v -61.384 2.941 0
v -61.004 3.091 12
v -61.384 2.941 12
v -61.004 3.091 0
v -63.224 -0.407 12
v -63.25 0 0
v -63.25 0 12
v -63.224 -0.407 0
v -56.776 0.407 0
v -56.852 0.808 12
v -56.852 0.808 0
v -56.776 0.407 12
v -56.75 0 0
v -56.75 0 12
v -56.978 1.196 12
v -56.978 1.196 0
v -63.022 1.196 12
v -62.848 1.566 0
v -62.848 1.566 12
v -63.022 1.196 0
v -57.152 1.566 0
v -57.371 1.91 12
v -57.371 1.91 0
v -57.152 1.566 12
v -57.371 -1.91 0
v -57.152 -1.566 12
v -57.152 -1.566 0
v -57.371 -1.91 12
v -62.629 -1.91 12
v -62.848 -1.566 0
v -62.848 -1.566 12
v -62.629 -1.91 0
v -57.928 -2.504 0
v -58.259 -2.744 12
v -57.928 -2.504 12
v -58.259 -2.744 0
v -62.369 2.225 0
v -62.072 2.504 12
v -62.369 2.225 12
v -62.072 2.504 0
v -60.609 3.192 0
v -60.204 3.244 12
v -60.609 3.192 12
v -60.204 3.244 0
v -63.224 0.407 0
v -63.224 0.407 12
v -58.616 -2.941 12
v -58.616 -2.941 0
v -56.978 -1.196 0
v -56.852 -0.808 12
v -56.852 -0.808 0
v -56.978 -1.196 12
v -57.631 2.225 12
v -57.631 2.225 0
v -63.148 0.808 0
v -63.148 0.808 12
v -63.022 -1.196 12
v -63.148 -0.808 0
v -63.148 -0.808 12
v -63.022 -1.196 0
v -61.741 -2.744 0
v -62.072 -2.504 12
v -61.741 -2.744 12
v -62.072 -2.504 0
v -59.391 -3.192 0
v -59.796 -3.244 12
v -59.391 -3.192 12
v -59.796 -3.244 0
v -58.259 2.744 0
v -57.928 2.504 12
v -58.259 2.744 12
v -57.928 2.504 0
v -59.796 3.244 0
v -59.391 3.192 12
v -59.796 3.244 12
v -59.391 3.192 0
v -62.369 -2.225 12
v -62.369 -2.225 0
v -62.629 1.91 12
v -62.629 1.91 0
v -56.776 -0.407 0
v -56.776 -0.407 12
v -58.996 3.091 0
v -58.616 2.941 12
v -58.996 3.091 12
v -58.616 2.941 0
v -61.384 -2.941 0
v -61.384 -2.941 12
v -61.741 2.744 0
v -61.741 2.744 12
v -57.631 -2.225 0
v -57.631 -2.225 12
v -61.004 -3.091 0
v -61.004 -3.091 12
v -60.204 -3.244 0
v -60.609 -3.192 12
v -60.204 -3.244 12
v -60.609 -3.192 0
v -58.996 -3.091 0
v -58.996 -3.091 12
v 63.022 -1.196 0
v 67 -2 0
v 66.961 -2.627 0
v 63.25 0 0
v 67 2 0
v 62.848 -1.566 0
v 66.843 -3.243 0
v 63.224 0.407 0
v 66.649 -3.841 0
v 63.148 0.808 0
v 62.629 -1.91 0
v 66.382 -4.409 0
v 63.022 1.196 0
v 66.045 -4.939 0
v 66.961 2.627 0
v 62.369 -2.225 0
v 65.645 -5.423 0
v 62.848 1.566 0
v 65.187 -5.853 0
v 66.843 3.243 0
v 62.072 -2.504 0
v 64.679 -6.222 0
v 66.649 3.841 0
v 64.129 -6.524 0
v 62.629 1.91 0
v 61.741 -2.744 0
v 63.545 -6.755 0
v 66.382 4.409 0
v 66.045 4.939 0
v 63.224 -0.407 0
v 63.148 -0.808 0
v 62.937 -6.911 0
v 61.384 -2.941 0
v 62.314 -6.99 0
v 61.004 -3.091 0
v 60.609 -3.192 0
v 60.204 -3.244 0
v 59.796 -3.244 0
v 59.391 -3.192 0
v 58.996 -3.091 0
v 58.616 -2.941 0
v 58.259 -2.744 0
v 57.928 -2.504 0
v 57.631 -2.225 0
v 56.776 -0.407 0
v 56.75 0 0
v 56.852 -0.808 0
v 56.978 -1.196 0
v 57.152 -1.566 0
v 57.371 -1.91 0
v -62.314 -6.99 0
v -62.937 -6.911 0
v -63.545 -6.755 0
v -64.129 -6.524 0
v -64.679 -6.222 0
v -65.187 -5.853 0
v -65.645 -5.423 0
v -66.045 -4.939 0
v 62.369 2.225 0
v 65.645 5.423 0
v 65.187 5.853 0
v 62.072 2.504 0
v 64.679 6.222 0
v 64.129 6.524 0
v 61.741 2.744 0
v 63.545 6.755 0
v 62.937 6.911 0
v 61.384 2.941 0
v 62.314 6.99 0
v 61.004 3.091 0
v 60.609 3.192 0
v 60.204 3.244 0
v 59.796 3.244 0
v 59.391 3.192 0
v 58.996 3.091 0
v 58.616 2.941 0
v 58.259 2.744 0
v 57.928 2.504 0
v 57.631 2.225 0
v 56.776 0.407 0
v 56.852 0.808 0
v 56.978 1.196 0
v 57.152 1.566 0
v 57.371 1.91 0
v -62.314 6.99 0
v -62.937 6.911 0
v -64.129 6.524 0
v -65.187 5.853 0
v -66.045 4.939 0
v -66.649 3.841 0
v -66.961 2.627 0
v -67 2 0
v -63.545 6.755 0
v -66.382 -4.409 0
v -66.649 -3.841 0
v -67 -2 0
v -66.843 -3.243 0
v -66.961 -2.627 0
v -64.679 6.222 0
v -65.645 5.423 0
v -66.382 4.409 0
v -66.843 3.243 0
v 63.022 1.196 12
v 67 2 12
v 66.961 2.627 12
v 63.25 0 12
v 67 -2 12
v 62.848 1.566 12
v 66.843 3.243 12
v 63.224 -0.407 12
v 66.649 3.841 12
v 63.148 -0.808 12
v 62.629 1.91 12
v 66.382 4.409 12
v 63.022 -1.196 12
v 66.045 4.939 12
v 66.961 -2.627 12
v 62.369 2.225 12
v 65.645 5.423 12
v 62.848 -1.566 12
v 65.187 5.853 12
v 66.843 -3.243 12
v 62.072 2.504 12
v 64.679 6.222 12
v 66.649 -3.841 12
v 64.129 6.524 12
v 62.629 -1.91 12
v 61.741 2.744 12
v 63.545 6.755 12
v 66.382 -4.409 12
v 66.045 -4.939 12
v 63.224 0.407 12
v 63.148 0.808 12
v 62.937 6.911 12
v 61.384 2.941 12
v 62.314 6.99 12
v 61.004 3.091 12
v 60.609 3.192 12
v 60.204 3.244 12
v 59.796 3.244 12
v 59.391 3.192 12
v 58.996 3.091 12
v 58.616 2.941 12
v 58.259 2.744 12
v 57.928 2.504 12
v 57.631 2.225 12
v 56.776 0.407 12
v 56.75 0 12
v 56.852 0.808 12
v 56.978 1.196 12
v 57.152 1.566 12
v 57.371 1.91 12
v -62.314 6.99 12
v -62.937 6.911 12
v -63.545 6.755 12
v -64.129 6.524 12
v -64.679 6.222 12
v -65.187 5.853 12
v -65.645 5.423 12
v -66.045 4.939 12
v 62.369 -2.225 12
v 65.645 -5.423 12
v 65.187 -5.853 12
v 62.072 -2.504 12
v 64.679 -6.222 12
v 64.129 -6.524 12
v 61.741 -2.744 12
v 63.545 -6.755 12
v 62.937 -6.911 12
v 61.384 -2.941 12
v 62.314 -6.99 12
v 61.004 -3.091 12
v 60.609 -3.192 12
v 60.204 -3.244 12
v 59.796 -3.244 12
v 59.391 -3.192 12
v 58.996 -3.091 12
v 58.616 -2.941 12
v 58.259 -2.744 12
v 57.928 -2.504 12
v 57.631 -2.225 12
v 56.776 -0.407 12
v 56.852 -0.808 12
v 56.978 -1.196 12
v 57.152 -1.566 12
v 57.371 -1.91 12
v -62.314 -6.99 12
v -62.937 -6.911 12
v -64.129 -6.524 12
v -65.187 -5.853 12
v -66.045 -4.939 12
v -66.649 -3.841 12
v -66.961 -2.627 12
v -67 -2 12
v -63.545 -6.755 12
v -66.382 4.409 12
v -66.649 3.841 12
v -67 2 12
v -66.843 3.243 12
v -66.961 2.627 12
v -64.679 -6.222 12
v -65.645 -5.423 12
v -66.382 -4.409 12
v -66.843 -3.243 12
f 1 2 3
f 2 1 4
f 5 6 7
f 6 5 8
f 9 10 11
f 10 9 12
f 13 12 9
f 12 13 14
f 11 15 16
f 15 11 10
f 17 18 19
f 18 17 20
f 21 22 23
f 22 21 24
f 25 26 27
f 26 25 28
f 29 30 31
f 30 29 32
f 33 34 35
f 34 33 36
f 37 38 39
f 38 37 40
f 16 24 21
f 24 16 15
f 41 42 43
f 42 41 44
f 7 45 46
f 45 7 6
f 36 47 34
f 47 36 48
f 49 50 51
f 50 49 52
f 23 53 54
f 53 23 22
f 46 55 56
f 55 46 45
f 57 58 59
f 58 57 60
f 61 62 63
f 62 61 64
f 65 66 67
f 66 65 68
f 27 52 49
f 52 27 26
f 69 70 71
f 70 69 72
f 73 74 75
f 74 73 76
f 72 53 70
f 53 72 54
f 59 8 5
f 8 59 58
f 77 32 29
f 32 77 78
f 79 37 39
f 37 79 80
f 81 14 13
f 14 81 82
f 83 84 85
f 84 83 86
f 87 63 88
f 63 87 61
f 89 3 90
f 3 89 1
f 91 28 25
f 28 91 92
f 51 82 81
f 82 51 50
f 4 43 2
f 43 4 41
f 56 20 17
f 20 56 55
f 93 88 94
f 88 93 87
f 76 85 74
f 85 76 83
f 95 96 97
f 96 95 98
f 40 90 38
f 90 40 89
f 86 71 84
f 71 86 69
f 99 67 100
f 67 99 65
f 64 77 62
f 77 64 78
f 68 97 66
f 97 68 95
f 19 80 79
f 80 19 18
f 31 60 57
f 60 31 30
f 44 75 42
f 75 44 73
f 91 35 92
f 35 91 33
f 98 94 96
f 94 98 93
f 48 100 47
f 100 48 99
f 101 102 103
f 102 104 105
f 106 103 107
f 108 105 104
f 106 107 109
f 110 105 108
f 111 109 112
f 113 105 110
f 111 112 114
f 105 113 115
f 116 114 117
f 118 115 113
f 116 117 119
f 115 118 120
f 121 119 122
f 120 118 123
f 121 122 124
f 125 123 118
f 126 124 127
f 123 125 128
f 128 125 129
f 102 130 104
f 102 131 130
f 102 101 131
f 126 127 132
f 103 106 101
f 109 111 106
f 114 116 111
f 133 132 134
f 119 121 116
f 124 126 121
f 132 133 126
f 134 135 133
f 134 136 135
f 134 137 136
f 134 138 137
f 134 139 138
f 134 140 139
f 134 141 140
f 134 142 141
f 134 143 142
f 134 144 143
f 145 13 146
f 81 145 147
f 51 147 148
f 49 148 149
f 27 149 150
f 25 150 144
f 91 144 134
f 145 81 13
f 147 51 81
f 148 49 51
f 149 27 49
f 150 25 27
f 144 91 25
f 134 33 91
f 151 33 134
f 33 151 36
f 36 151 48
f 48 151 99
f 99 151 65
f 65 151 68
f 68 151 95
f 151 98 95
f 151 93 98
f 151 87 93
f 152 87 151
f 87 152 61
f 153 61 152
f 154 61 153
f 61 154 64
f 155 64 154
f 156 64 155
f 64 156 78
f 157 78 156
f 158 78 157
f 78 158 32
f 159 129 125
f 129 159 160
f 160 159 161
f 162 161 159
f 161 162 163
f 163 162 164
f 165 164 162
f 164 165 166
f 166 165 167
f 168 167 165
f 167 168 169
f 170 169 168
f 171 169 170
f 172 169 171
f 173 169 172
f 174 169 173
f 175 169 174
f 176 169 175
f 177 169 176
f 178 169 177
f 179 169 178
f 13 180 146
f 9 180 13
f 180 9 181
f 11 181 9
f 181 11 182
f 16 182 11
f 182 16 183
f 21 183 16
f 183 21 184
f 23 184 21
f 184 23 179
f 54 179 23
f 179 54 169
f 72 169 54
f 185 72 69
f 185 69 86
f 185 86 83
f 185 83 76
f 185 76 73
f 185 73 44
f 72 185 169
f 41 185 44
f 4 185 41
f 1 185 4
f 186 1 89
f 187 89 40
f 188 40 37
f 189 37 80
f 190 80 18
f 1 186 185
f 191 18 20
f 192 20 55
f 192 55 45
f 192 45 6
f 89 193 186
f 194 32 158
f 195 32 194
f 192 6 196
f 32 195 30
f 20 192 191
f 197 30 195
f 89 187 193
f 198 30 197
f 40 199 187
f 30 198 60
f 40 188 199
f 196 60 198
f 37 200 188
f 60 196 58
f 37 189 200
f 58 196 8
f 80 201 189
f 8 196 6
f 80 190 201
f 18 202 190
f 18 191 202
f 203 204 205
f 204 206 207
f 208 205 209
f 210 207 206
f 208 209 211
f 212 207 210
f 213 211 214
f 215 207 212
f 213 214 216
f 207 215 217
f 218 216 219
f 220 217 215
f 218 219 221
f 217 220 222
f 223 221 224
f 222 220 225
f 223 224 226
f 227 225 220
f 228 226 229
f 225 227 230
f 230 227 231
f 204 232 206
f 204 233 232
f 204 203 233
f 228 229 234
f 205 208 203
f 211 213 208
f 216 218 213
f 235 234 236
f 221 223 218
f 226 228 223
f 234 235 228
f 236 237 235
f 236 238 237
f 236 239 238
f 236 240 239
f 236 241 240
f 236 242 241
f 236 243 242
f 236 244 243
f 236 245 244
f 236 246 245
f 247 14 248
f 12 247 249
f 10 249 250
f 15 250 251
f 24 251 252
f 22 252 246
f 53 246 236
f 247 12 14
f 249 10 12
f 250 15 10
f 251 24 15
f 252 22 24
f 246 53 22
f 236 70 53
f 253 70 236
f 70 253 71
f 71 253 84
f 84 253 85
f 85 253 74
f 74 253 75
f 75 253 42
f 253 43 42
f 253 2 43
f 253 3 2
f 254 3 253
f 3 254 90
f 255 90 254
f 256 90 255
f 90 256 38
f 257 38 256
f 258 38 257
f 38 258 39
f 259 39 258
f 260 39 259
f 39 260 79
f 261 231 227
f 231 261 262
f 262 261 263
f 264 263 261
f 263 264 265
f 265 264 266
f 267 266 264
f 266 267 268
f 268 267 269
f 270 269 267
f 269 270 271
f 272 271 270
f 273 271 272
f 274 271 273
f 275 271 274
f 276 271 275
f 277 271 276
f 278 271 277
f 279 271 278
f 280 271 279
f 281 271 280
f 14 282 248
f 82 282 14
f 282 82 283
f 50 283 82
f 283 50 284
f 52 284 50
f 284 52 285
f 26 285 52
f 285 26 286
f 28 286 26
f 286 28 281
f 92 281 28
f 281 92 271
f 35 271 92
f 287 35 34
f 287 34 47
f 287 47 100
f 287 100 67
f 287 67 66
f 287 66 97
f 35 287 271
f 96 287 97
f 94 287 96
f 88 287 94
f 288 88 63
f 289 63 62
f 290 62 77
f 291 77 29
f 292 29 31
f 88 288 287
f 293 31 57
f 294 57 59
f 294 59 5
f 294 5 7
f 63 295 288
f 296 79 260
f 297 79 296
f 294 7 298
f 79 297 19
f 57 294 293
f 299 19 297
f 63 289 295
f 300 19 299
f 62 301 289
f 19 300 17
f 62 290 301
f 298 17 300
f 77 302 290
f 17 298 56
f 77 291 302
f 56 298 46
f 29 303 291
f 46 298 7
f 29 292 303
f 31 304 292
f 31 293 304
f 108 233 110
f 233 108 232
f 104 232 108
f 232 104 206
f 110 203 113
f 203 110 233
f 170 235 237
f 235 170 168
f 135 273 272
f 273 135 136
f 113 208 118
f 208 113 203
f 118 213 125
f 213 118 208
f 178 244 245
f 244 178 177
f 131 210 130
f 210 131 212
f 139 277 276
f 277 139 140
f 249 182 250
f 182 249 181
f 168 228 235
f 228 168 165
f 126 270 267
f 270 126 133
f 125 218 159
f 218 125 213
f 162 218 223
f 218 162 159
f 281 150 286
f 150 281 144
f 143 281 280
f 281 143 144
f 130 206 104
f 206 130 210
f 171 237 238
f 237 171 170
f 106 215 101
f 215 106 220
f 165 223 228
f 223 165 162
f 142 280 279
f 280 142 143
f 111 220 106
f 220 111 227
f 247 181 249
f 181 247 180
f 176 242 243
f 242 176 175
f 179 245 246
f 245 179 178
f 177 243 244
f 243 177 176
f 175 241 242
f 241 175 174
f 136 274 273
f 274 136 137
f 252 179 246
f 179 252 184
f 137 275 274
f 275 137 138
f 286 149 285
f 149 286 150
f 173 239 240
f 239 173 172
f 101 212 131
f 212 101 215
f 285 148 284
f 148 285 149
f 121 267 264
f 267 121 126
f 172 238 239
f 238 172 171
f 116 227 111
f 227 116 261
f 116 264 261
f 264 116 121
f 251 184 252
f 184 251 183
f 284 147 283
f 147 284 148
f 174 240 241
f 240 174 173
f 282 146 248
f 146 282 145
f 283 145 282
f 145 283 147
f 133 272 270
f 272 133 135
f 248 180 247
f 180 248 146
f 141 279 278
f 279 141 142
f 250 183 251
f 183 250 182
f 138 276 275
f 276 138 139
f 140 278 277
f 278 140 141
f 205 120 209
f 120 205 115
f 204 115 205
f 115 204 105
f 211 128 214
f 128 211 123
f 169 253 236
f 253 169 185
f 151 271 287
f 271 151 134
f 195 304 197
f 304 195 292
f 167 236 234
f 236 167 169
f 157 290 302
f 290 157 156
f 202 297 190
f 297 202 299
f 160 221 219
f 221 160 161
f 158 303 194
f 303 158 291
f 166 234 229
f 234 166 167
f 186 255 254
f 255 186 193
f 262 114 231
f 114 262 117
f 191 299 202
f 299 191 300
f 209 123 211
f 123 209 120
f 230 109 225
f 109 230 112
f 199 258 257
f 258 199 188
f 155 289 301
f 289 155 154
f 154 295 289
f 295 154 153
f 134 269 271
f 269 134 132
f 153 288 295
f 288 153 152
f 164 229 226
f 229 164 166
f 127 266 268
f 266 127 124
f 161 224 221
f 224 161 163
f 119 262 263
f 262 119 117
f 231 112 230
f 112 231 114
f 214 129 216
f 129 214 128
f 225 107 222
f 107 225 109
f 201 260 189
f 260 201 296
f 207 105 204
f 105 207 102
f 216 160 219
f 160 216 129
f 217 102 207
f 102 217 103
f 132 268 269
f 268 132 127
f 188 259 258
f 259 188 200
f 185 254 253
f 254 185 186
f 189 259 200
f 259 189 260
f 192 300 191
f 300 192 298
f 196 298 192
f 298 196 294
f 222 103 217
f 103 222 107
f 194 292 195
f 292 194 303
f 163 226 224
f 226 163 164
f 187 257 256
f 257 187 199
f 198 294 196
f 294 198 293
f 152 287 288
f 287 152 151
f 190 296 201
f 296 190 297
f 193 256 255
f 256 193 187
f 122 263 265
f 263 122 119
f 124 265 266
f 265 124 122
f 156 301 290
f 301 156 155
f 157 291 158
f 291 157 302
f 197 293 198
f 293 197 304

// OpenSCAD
$fn = 50;


difference() {
	union() {
		hull() {
			translate(v = [-62.0000000000, 2.0000000000, 0]) {
				cylinder(h = 12, r = 5);
			}
			translate(v = [62.0000000000, 2.0000000000, 0]) {
				cylinder(h = 12, r = 5);
			}
			translate(v = [-62.0000000000, -2.0000000000, 0]) {
				cylinder(h = 12, r = 5);
			}
			translate(v = [62.0000000000, -2.0000000000, 0]) {
				cylinder(h = 12, r = 5);
			}
		}
	}
	union() {
		translate(v = [-60.0000000000, 0.0000000000, 0]) {
			cylinder(h = 12, r = 3.2500000000);
		}
		translate(v = [60.0000000000, 0.0000000000, 0]) {
			cylinder(h = 12, r = 3.2500000000);
		}
		translate(v = [-60.0000000000, 0.0000000000, 0]) {
			cylinder(h = 12, r = 1.8000000000);
		}
		translate(v = [60.0000000000, 0.0000000000, 0]) {
			cylinder(h = 12, r = 1.8000000000);
		}
		translate(v = [-60.0000000000, 0.0000000000, 0]) {
			cylinder(h = 12, r = 1.8000000000);
		}
		translate(v = [60.0000000000, 0.0000000000, 0]) {
			cylinder(h = 12, r = 1.8000000000);
		}
		translate(v = [-60.0000000000, 0.0000000000, 0]) {
			cylinder(h = 12, r = 1.8000000000);
		}
		translate(v = [60.0000000000, 0.0000000000, 0]) {
			cylinder(h = 12, r = 1.8000000000);
		}
	}
}
